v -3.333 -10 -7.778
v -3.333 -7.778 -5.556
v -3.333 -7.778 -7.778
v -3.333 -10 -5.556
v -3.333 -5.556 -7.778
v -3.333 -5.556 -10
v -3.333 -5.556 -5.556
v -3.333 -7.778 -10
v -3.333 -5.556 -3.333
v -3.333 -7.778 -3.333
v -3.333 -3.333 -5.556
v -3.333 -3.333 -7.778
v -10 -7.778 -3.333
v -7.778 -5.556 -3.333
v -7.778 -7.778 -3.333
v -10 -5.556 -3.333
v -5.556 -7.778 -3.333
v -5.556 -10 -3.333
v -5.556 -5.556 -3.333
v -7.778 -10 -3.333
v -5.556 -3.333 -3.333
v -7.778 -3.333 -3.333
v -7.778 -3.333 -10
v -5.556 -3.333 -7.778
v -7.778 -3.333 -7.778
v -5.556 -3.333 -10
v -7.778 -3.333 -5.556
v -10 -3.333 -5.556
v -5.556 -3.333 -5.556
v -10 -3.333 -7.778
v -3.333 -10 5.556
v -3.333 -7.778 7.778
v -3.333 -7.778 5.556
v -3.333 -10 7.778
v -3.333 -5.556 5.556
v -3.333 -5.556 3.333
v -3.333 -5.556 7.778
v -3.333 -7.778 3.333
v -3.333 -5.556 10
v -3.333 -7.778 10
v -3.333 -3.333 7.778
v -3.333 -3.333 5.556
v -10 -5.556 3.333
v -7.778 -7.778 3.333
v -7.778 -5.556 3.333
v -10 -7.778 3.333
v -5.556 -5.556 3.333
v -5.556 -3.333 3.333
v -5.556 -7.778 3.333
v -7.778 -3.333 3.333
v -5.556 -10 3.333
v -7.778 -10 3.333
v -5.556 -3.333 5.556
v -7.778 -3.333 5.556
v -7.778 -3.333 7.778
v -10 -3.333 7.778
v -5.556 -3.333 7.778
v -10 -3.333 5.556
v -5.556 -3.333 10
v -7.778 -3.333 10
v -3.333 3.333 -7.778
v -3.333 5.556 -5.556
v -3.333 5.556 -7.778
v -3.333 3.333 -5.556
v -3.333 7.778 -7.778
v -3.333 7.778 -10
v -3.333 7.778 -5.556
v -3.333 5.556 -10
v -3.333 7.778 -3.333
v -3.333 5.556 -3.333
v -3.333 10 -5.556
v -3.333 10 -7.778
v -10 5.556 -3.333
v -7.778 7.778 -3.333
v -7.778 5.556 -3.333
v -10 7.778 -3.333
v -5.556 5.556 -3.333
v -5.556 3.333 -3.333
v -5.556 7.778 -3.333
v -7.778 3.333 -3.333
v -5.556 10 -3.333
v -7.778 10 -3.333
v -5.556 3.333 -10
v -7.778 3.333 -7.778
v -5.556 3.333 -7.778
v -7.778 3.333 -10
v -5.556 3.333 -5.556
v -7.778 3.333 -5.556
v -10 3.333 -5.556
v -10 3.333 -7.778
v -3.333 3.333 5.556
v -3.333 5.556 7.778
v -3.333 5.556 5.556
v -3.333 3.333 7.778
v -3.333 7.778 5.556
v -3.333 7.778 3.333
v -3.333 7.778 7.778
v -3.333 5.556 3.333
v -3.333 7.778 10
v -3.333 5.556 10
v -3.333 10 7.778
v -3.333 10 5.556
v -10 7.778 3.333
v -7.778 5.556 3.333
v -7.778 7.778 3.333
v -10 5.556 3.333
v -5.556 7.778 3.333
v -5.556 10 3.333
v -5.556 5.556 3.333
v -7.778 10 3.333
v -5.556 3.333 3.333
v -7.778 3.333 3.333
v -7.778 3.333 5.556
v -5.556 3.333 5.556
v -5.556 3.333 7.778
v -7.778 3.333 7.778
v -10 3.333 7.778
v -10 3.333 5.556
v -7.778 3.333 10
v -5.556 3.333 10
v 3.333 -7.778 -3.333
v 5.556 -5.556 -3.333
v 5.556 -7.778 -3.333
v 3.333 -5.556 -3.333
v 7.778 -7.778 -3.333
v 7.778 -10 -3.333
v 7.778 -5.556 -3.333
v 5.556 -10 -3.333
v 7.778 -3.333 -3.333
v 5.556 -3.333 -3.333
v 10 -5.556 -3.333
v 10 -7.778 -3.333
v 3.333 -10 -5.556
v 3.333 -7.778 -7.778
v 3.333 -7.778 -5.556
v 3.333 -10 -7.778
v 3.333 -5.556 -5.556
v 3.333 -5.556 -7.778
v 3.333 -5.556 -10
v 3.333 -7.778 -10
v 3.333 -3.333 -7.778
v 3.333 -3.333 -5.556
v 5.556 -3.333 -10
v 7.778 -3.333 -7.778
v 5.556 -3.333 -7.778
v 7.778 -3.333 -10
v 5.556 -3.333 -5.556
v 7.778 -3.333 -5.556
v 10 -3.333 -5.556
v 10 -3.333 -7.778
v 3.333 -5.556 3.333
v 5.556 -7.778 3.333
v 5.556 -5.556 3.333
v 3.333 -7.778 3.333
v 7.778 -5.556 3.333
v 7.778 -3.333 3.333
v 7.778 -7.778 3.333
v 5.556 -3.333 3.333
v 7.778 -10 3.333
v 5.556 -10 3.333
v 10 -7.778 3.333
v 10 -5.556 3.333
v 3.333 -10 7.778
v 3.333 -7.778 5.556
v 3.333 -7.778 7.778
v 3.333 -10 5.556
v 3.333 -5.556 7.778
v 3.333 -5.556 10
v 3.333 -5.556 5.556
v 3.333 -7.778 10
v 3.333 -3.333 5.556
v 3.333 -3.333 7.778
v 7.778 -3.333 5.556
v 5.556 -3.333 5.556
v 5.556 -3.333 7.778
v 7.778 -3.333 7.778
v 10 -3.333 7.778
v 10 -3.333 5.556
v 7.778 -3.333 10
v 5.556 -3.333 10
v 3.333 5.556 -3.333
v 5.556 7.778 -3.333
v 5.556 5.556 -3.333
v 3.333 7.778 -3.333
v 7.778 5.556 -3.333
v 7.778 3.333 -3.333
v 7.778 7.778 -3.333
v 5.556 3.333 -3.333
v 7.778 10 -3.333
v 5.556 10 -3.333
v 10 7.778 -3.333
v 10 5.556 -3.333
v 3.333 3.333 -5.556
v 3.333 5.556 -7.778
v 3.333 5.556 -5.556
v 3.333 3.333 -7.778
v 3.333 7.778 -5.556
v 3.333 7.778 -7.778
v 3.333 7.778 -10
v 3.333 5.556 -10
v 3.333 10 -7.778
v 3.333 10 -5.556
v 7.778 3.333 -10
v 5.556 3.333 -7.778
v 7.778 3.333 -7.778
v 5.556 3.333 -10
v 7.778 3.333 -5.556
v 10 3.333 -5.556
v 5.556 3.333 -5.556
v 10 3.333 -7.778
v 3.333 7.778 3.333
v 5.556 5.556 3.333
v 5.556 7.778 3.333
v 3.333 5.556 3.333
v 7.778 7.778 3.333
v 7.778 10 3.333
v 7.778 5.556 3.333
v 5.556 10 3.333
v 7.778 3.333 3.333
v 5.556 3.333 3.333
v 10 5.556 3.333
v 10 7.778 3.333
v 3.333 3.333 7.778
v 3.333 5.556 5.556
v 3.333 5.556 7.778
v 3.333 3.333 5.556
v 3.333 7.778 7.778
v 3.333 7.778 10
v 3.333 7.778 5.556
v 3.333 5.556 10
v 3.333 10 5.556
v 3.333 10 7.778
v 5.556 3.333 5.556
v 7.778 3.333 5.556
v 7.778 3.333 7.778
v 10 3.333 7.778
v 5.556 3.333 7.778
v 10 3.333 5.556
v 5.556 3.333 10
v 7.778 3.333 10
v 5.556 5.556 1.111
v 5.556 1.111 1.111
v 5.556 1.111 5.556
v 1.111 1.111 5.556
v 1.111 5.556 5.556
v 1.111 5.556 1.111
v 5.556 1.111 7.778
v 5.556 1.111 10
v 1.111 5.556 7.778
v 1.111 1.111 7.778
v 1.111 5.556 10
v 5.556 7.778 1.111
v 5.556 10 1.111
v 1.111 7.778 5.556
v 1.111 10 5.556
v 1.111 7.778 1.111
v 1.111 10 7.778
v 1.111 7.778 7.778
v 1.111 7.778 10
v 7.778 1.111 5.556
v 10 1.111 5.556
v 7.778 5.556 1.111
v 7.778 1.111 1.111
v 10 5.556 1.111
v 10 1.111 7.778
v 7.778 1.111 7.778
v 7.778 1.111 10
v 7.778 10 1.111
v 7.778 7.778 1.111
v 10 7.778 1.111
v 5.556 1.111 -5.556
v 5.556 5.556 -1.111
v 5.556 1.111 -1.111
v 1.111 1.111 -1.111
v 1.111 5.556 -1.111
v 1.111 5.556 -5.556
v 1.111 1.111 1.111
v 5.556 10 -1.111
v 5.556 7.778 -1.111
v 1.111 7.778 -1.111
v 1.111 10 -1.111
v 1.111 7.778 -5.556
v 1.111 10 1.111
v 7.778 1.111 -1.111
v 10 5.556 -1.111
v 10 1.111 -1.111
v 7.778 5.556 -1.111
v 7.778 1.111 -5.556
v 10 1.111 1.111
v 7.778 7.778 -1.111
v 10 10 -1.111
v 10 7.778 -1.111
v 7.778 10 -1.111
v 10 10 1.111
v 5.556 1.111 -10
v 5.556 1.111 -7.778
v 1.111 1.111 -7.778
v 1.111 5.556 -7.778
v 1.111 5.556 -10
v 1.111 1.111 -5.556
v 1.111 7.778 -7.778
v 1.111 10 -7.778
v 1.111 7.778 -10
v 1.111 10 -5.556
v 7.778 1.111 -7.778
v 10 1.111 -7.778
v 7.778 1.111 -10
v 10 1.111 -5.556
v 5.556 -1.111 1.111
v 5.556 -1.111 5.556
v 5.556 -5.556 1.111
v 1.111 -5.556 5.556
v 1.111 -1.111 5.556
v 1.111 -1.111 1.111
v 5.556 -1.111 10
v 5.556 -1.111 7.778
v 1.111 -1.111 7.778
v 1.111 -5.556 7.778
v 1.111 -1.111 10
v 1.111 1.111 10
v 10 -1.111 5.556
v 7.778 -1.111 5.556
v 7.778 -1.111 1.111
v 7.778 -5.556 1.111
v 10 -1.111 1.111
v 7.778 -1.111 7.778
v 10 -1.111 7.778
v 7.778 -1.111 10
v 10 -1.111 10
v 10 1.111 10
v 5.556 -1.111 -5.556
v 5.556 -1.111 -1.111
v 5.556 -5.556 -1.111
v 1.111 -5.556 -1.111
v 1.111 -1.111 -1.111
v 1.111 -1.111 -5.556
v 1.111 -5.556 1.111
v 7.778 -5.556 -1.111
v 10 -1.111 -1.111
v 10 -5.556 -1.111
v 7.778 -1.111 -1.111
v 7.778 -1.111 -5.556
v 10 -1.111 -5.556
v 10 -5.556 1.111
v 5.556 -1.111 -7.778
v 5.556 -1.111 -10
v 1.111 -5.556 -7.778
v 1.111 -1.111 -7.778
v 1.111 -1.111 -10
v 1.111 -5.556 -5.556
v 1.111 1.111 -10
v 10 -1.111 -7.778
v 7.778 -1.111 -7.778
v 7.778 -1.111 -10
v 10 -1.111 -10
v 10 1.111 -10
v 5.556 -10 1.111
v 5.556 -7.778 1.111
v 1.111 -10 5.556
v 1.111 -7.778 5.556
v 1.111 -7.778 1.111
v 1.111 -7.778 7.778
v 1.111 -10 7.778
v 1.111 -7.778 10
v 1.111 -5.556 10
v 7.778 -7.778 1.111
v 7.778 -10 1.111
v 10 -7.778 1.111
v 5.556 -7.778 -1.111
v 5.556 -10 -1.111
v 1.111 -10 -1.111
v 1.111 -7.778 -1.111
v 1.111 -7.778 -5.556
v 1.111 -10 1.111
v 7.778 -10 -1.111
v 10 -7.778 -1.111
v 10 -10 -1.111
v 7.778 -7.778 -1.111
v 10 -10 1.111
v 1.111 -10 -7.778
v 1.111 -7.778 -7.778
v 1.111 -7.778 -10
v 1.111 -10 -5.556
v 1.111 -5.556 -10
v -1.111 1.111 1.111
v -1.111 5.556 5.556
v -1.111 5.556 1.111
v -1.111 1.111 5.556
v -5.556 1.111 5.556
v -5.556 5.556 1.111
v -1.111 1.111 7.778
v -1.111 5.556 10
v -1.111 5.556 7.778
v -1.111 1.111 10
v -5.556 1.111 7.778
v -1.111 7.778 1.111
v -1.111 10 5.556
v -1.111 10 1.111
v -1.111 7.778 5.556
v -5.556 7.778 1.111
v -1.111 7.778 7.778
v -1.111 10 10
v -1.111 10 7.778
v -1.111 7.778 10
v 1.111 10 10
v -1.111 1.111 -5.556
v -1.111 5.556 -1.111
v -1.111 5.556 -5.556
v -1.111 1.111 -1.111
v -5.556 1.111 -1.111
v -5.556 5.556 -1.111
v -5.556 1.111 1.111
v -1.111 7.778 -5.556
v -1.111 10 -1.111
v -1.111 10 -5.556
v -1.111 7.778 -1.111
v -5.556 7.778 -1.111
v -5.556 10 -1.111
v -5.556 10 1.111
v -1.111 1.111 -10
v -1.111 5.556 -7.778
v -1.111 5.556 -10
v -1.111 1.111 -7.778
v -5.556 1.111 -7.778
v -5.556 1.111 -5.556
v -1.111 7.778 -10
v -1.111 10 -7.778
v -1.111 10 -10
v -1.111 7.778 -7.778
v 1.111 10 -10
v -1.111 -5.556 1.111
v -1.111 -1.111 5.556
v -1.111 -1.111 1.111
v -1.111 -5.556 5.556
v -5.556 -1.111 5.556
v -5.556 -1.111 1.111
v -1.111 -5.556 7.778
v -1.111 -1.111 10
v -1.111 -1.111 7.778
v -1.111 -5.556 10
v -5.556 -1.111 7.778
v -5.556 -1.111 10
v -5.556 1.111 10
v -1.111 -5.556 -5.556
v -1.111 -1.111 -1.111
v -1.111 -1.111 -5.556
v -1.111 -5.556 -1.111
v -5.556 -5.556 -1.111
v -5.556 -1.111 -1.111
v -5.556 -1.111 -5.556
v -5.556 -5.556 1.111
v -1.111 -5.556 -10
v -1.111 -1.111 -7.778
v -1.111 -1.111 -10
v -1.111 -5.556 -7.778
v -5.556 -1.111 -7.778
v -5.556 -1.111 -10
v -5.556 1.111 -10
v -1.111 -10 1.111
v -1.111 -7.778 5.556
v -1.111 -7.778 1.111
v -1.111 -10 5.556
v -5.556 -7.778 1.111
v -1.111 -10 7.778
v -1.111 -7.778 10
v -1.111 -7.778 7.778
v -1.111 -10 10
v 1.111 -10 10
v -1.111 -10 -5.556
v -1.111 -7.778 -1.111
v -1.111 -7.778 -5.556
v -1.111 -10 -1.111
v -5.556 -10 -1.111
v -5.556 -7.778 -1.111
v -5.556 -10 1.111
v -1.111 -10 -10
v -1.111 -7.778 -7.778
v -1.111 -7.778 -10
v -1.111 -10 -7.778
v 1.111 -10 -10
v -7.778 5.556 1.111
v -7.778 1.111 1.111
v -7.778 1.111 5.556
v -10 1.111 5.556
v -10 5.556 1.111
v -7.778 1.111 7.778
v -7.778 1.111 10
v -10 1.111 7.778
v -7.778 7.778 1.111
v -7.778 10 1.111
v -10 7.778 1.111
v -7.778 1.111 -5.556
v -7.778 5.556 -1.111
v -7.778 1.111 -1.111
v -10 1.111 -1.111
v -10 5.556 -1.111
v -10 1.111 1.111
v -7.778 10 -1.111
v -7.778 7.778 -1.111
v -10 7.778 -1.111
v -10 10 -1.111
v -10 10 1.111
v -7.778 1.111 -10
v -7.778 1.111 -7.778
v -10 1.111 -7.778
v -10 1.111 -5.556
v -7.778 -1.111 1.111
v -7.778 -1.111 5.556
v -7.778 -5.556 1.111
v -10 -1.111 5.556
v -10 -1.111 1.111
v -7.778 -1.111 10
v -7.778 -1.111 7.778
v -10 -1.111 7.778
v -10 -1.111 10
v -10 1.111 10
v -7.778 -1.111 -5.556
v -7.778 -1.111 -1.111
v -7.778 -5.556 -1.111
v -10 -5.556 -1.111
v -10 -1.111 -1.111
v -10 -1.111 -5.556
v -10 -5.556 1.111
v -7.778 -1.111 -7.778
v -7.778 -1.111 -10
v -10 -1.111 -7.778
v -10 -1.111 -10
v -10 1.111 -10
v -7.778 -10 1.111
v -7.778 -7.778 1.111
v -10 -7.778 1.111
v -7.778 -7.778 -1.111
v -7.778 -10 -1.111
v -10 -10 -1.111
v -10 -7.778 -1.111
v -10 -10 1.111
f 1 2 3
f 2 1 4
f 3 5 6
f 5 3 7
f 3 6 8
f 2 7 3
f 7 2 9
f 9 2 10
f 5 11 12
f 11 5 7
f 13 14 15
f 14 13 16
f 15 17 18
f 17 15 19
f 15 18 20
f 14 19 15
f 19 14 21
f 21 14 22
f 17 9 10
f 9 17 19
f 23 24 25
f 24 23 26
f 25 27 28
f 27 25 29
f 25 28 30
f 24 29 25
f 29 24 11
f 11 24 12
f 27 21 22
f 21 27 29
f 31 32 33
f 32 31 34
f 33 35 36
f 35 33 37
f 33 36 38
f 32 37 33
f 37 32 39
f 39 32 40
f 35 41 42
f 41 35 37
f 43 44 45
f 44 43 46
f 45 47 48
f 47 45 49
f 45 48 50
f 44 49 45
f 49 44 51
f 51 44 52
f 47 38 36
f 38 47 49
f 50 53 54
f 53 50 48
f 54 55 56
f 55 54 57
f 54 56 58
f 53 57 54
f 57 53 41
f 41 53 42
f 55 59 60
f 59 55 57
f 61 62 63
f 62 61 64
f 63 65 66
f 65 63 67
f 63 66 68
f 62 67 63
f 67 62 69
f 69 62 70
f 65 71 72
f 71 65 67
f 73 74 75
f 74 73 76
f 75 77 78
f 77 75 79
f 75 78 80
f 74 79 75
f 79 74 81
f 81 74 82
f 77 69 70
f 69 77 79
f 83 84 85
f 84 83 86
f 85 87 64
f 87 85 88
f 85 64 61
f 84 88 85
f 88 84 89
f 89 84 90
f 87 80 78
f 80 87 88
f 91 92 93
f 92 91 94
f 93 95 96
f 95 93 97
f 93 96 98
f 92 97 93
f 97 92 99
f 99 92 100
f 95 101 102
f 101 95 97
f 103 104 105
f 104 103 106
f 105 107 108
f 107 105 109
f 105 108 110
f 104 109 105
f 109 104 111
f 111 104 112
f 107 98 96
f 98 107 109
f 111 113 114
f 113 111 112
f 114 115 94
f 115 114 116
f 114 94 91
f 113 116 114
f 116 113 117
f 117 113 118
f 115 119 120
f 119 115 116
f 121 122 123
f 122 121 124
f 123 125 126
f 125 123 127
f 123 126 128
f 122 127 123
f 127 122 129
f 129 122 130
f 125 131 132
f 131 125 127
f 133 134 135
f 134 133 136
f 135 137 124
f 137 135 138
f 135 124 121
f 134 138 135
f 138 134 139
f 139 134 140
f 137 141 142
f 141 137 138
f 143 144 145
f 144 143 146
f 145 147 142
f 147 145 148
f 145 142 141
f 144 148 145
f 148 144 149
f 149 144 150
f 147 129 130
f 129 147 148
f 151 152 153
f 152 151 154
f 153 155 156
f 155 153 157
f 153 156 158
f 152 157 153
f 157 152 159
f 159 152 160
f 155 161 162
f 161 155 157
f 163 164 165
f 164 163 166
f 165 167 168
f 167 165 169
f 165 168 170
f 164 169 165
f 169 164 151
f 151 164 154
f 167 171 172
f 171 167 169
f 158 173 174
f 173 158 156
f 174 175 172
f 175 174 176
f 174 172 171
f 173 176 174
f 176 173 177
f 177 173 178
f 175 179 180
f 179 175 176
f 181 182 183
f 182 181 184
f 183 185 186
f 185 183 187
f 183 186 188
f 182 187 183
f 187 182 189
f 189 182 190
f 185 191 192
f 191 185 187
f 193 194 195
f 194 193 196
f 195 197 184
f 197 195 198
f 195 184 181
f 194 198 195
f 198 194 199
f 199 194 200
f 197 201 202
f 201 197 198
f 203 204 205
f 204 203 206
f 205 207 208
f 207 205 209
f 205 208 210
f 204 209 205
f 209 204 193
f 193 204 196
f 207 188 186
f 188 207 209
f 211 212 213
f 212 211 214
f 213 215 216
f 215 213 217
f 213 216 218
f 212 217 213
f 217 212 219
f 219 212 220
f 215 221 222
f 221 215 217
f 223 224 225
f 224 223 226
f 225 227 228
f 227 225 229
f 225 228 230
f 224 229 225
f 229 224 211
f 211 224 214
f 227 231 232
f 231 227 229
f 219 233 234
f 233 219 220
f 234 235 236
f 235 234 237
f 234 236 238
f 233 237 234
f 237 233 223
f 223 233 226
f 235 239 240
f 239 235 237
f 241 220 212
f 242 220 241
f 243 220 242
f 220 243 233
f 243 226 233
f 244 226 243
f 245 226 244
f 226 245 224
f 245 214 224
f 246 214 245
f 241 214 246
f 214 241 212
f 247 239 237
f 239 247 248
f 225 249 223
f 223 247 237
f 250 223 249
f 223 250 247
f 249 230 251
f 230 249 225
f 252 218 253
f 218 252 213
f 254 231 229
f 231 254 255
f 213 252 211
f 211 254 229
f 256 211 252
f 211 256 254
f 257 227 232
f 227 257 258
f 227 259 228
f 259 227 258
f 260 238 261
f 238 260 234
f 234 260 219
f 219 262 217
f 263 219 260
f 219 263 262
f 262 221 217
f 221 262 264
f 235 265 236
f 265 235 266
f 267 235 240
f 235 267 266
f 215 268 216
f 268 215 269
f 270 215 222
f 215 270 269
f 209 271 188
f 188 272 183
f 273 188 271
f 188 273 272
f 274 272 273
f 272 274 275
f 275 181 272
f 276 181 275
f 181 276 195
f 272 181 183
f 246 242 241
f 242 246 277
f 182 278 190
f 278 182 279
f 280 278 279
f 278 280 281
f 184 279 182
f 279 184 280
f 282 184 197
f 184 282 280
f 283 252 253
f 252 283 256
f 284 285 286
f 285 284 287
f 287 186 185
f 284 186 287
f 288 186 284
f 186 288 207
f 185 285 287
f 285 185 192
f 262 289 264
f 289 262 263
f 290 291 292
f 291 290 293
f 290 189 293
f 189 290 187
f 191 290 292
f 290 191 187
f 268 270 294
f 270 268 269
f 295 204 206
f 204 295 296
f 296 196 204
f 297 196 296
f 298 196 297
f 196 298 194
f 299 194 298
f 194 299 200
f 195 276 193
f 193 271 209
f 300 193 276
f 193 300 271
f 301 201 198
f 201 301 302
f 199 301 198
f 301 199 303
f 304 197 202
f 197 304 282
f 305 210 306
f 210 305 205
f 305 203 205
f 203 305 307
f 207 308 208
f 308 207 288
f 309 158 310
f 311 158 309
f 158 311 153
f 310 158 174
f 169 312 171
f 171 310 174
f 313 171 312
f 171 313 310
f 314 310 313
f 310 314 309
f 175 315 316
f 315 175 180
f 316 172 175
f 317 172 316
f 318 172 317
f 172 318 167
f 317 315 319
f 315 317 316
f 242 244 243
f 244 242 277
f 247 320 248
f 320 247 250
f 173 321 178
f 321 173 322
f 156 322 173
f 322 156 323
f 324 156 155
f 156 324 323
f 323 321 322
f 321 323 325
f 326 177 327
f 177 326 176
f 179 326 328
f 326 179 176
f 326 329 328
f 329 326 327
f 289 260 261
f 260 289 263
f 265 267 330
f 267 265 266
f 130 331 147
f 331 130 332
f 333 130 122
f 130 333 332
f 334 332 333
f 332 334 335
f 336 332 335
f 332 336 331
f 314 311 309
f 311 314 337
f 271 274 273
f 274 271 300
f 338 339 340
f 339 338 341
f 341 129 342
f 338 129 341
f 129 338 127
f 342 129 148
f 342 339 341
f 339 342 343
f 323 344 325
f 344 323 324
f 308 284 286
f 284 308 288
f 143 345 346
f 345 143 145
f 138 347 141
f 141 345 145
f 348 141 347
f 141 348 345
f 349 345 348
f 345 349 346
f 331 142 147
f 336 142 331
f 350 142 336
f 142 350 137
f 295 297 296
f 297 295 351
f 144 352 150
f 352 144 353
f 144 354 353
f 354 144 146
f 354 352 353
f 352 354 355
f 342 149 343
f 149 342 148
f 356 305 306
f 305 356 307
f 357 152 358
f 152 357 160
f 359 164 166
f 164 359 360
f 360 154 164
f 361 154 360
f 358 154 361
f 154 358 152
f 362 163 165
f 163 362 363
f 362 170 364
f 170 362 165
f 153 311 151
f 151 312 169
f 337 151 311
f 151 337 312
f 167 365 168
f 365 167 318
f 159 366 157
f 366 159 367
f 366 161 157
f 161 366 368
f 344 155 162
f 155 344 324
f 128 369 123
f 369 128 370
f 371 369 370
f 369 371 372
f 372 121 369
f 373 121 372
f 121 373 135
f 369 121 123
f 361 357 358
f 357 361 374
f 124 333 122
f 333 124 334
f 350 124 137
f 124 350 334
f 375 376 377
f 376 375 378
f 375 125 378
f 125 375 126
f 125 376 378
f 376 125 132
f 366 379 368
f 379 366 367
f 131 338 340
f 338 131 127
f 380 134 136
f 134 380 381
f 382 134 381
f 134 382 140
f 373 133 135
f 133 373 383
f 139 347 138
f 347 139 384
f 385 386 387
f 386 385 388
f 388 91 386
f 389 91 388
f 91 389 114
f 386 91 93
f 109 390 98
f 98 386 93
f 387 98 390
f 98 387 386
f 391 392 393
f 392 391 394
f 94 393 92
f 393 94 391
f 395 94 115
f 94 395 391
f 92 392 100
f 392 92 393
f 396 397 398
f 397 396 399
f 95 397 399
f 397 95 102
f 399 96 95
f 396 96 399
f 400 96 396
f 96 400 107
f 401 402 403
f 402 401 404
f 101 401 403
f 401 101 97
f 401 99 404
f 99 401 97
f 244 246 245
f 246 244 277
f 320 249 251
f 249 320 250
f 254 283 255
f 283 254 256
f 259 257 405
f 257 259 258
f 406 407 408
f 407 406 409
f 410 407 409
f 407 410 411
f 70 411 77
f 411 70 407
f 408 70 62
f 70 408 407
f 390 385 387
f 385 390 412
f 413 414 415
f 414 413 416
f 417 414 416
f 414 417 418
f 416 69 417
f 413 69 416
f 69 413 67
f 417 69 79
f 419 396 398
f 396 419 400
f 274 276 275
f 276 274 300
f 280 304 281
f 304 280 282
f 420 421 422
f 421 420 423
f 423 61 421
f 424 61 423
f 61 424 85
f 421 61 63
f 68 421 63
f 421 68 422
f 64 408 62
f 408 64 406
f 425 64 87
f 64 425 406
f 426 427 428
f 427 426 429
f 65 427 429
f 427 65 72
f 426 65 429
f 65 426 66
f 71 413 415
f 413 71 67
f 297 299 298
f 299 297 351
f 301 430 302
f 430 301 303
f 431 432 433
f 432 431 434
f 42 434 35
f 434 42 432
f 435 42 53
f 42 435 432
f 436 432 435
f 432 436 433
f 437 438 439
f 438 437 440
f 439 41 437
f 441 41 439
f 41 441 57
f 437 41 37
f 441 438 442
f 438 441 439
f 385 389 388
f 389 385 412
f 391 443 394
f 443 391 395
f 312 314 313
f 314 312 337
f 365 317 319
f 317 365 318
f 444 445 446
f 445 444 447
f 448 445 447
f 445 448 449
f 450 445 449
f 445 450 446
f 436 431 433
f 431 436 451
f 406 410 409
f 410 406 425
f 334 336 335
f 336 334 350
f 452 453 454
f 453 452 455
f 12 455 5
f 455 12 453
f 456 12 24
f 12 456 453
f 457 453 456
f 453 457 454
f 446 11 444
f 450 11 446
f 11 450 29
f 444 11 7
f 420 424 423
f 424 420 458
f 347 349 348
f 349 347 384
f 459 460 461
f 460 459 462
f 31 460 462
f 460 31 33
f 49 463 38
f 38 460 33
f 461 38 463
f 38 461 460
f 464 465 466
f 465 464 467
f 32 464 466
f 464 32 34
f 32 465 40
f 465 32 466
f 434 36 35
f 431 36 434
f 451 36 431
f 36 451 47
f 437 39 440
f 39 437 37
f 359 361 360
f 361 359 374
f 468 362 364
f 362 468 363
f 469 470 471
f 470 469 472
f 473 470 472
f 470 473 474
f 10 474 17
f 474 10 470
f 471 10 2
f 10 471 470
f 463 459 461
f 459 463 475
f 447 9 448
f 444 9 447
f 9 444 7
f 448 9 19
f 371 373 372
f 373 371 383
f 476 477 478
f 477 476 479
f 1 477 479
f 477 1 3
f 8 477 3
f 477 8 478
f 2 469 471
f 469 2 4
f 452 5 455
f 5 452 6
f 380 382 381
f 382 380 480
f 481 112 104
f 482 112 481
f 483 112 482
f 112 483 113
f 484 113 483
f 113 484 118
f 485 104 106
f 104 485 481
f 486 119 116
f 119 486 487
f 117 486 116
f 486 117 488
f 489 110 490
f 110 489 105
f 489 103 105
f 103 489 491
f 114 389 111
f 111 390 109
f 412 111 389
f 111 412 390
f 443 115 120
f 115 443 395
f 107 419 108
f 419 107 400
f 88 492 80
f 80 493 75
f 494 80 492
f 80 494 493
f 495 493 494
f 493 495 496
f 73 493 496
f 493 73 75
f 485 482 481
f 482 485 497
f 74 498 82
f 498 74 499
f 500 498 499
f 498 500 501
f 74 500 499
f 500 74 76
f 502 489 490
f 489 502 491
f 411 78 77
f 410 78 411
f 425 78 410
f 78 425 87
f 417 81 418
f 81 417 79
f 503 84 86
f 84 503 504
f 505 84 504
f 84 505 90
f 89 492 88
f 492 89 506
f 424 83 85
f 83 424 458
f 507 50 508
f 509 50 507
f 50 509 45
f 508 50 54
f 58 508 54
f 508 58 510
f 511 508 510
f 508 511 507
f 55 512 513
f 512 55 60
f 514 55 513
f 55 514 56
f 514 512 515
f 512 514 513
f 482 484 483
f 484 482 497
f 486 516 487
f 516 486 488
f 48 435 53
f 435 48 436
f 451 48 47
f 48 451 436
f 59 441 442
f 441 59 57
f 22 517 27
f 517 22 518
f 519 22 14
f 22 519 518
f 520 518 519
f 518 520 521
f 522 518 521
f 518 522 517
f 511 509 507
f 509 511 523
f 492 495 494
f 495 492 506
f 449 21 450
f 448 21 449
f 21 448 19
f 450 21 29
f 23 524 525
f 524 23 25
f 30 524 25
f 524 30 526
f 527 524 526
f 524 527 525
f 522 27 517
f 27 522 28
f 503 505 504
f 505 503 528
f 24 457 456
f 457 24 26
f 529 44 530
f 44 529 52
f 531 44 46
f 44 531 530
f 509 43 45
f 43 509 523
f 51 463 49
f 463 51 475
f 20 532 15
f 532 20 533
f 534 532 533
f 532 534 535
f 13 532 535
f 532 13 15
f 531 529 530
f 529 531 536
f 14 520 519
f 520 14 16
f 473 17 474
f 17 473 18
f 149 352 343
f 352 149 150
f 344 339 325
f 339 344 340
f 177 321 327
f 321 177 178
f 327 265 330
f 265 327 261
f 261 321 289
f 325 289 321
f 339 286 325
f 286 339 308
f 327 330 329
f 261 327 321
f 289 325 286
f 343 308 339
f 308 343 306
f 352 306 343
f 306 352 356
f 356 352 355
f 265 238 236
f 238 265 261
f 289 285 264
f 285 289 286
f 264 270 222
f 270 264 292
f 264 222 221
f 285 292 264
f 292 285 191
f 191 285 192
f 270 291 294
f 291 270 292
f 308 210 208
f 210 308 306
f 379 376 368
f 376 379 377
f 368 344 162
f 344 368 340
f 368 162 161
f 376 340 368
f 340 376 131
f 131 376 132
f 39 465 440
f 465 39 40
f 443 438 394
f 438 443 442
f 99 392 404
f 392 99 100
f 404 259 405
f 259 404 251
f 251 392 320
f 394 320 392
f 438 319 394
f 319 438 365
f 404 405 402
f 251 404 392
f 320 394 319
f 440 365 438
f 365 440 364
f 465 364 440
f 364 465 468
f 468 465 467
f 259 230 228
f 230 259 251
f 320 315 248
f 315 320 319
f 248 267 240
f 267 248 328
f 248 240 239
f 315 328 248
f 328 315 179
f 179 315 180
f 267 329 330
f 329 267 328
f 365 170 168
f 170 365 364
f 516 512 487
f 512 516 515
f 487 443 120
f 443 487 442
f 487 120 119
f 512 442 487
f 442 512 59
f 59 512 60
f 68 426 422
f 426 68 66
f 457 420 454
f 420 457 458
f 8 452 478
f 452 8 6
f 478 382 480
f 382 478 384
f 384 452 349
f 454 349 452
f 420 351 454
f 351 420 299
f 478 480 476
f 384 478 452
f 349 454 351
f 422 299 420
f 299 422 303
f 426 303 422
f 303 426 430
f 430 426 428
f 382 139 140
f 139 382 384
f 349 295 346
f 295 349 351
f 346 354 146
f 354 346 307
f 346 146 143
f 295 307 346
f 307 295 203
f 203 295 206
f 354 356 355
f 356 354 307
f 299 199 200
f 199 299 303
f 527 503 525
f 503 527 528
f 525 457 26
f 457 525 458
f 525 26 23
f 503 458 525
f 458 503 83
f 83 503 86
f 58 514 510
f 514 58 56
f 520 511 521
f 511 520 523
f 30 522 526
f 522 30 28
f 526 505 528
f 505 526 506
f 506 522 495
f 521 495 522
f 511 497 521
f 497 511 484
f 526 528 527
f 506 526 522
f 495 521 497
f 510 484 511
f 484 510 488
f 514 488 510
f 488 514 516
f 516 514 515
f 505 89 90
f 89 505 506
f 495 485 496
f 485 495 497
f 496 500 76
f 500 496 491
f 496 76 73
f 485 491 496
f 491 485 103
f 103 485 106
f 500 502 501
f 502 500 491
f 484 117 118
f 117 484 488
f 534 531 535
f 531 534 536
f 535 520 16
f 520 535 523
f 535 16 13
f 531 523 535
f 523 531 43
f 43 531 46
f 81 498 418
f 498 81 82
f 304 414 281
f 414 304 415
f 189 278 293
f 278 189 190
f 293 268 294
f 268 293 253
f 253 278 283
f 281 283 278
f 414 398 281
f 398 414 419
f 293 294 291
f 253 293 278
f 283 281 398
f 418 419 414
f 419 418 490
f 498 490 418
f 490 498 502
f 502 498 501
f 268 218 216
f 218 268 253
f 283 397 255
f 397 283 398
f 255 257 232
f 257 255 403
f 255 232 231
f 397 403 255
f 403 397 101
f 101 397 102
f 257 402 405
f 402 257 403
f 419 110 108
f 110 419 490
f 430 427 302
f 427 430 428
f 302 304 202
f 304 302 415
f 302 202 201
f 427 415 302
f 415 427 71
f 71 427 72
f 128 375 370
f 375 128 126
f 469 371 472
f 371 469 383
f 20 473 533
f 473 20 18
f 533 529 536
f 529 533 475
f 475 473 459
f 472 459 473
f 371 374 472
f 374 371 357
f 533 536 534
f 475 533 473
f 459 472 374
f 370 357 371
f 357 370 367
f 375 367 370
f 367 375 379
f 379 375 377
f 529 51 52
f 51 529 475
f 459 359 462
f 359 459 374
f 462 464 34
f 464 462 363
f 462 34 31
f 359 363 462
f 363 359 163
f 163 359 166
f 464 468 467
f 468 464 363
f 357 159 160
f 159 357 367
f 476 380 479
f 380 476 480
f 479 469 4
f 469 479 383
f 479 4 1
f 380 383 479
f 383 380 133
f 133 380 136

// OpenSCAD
size = 20;
iterations = 2;
clearExtra = 0.1;

difference() {
    cube(size = size, center = true);
    for (i = [0: iterations-1]) {
	    currentSize = size / pow(3, i);
        smallSize = size / 3 / pow(3, i); 
        innerLoopSize = (pow(3, i) - 1) / 2; 
        for (xLoop = [-innerLoopSize:innerLoopSize]) {
            for (yLoop = [-innerLoopSize:innerLoopSize]) {
                for (zLoop = [-innerLoopSize:innerLoopSize]) {
                    for (x = [-smallSize - clearExtra, smallSize + clearExtra]) {
                        for (y = [-smallSize - clearExtra, smallSize + clearExtra]) {
                            for (z = [-smallSize - clearExtra, smallSize + clearExtra]) {
                                translate([
                                    x - xLoop * currentSize, 
                                    y - yLoop * currentSize, 
                                    z - zLoop * currentSize
                                ])
                                cube(size = smallSize + 2 * clearExtra, center = true);
                            }
                        }
                    }
                }
			}
        }
	}
}
